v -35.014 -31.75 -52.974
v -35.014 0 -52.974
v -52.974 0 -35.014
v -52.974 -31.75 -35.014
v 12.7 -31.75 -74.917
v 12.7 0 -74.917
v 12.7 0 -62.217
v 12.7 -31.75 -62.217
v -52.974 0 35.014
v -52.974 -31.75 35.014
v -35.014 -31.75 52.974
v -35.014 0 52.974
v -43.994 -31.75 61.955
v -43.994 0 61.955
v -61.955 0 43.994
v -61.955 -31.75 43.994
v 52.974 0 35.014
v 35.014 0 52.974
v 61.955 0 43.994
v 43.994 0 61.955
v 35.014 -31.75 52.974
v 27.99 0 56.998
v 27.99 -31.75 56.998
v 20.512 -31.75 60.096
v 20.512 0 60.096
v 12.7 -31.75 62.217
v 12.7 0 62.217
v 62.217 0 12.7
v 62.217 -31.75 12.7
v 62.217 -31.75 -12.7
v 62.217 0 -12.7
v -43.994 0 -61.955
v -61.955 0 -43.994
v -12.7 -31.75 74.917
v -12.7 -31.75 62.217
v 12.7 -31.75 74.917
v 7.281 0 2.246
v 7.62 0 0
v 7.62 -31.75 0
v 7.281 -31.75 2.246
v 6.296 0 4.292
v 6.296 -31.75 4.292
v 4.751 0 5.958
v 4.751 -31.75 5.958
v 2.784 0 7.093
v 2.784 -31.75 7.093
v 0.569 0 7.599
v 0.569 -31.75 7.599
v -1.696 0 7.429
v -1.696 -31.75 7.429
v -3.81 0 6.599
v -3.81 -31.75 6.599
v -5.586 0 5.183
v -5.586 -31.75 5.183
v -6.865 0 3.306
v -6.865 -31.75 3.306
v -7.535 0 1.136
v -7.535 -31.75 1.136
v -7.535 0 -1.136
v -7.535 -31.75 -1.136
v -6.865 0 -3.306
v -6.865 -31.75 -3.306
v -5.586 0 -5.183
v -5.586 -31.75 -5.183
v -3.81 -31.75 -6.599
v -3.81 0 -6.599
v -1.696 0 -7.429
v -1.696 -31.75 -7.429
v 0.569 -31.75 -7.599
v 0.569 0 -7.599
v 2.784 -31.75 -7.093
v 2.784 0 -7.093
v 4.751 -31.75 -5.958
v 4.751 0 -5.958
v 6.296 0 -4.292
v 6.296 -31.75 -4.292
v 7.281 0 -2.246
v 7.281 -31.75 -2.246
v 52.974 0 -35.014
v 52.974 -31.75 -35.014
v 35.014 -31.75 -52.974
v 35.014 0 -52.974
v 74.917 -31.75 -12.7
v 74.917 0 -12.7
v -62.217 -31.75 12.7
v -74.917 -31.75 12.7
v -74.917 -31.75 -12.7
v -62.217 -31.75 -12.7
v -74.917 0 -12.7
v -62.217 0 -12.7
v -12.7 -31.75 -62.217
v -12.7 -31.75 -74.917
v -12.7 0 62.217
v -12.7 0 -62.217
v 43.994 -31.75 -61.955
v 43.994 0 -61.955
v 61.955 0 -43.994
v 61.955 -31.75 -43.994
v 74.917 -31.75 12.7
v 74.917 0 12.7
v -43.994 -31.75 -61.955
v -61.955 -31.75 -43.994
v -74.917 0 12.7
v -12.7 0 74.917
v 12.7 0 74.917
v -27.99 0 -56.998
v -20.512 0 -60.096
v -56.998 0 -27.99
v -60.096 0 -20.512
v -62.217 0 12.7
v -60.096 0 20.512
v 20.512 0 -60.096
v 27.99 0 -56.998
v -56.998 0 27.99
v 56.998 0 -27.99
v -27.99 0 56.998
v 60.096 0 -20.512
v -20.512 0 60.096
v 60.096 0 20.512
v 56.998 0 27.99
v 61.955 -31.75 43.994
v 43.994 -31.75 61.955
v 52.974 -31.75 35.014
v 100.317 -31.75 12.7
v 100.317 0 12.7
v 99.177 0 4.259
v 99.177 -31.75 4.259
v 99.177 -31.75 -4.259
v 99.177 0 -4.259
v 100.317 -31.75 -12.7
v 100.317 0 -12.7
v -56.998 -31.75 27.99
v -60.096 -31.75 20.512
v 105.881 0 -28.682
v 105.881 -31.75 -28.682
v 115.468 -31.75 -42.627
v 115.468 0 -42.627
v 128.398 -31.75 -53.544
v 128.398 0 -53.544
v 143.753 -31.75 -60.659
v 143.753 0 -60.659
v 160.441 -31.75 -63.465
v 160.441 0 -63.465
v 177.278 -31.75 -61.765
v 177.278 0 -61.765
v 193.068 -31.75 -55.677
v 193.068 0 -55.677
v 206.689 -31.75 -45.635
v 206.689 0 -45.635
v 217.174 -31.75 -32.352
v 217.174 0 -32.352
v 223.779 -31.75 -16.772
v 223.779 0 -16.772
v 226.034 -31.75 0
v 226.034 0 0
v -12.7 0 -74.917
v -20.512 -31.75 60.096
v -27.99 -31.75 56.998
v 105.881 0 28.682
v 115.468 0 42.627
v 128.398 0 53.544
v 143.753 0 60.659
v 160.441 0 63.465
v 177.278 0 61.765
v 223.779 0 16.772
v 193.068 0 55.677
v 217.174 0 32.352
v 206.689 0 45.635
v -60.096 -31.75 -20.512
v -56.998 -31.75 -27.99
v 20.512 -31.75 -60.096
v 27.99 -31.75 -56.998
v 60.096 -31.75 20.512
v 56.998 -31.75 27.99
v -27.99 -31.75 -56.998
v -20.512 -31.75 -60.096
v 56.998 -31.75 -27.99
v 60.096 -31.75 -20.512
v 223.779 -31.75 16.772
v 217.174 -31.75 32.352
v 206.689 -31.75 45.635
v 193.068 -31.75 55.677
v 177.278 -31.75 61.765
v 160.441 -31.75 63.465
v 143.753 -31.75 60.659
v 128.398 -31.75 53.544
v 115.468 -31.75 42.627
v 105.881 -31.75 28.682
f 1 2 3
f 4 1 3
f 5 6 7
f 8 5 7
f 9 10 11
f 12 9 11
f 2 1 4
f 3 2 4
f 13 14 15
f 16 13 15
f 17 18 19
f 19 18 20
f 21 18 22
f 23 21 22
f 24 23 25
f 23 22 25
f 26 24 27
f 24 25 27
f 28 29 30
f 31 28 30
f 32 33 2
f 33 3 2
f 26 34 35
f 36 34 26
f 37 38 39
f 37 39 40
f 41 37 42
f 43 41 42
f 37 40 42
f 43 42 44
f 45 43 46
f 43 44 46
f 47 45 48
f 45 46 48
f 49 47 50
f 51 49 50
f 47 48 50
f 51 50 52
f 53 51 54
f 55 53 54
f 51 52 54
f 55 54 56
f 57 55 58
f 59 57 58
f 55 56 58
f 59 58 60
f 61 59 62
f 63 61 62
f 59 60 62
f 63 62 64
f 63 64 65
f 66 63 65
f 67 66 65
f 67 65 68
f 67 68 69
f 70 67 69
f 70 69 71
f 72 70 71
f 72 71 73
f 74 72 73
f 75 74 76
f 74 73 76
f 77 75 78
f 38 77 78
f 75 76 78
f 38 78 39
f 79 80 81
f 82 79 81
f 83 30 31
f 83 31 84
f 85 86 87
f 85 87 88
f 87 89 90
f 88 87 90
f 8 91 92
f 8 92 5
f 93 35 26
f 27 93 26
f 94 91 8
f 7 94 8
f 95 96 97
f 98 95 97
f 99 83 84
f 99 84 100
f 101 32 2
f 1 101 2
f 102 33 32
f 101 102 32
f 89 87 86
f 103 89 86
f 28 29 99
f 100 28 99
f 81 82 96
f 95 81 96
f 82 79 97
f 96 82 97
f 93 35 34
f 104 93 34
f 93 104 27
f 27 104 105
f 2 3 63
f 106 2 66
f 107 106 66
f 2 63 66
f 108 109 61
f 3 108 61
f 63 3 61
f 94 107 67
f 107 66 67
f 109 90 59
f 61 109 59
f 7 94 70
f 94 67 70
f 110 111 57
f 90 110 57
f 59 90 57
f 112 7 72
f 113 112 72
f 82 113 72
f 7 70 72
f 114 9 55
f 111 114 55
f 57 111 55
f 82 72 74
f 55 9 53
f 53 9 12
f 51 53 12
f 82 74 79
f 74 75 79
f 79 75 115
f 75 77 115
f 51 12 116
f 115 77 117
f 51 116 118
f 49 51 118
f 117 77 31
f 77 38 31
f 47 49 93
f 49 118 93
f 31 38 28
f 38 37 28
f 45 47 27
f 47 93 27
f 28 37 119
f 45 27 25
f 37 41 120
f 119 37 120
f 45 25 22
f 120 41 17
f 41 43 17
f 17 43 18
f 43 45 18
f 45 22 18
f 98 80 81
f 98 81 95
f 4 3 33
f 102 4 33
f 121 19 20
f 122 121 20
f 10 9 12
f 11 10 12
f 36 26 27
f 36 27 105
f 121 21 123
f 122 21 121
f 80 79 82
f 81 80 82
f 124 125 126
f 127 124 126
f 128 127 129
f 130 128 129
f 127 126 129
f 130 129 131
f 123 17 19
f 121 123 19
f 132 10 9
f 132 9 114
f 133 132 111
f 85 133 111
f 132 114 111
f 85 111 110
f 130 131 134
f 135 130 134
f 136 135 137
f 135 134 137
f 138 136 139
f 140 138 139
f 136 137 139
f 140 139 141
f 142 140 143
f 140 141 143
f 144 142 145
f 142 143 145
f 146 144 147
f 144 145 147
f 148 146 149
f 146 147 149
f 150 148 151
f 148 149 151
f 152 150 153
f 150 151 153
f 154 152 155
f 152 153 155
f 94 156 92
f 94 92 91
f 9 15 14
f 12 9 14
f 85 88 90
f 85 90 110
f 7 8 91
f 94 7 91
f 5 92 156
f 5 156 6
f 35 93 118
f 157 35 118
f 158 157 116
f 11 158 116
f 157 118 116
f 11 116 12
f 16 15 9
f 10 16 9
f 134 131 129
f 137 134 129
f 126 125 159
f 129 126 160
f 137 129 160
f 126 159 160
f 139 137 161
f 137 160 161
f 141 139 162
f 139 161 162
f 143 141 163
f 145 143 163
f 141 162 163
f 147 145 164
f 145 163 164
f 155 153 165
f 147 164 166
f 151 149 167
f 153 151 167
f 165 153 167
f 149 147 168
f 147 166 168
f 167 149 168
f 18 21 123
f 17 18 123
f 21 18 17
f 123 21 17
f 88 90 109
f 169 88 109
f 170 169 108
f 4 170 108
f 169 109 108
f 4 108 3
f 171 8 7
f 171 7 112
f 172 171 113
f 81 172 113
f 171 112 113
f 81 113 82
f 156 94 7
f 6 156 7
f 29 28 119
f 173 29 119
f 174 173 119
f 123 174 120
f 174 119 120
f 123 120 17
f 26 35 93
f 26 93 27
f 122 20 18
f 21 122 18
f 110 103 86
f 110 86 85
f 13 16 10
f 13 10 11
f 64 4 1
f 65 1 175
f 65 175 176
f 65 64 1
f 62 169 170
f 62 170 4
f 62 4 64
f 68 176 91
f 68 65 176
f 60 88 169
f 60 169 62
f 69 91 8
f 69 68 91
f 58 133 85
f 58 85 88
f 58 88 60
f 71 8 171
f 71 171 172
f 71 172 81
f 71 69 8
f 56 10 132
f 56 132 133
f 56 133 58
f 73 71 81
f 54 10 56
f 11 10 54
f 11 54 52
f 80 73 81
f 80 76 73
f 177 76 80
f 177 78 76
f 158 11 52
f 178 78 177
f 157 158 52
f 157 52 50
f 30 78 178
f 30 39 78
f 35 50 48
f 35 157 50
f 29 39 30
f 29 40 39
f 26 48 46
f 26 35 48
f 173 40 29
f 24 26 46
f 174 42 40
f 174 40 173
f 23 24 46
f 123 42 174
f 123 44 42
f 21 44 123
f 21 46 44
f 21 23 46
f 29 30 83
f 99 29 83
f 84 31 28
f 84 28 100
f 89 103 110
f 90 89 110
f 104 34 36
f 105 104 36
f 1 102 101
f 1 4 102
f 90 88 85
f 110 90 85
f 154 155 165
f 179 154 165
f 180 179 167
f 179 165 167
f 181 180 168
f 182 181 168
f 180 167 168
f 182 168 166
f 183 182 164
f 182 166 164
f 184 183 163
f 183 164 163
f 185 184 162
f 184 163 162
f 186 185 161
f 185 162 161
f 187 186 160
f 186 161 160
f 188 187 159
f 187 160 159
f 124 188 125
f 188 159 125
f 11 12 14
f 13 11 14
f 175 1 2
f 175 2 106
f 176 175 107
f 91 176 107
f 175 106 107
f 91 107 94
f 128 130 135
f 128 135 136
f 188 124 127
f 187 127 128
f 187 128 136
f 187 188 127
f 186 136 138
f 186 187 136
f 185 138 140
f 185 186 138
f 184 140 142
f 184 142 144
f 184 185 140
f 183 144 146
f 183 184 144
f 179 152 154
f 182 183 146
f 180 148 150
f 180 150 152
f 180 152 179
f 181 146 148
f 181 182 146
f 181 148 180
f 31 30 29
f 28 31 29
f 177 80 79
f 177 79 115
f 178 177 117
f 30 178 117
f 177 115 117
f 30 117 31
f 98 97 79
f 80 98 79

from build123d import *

# Parameters (mm, degrees)
F0_R     = 63.5
F1_DEPTH = 31.75
F3_DEPTH = 31.75
F4_W     = 25.4
F4_H     = 12.7
F5_DEPTH = 31.75
F4_W_2   = 12.7
F4_H_2   = 25.4
F6_R     = 7.62
F7_DEPTH = 31.75
F9_DEPTH = 31.75


with BuildPart() as f1:
    # F0 (on Front) → F1 (new body)
    with BuildSketch(Plane.XZ):
        Circle(F0_R)
    extrude(amount=F1_DEPTH)

    # F2 (on face) → F3 (cut)
    with BuildSketch(Plane.XZ.offset(31.75)):
        with BuildLine():
            ThreePointArc((12.7, 62.2170394667), (0, 63.5), (-12.7, 62.2170394667))
            Line((-12.7, 62.2170394667), (12.7, 62.2170394667))
        make_face()
        with BuildLine():
            Line((-52.9743466333, 35.0138343912), (-35.0138343912, 52.9743466333))
            ThreePointArc((-35.0138343912, 52.9743466333), (-44.9012806053, 44.9012806053), (-52.9743466333, 35.0138343912))
        make_face()
        with BuildLine():
            Line((-62.2170394667, -12.7), (-62.2170394667, 12.7))
            ThreePointArc((-62.2170394667, 12.7), (-63.5, 0), (-62.2170394667, -12.7))
        make_face()
        with BuildLine():
            Line((-35.0138343912, -52.9743466333), (-52.9743466333, -35.0138343912))
            ThreePointArc((-52.9743466333, -35.0138343912), (-44.9012806053, -44.9012806053), (-35.0138343912, -52.9743466333))
        make_face()
        with BuildLine():
            Line((12.7, -62.2170394667), (-12.7, -62.2170394667))
            ThreePointArc((-12.7, -62.2170394667), (0, -63.5), (12.7, -62.2170394667))
        make_face()
        with BuildLine():
            Line((52.9743466333, -35.0138343912), (35.0138343912, -52.9743466333))
            ThreePointArc((35.0138343912, -52.9743466333), (44.9012806053, -44.9012806053), (52.9743466333, -35.0138343912))
        make_face()
        with BuildLine():
            Line((62.2170394667, 12.7), (62.2170394667, -12.7))
            ThreePointArc((62.2170394667, -12.7), (63.5, 0), (62.2170394667, 12.7))
        make_face()
        with BuildLine():
            Line((35.0138343912, 52.9743466333), (52.9743466333, 35.0138343912))
            ThreePointArc((52.9743466333, 35.0138343912), (44.9012806053, 44.9012806053), (35.0138343912, 52.9743466333))
        make_face()
    extrude(amount=-F3_DEPTH, mode=Mode.SUBTRACT)

    # F6 (on face) → F7 (cut)
    with BuildSketch(Plane.XZ.offset(31.75)):
        Circle(F6_R)
    extrude(amount=-F7_DEPTH, mode=Mode.SUBTRACT)


with BuildPart() as f5:
    # F4 (on Front) → F5 (new body)
    with BuildSketch(Plane.XZ):
        with Locations((0, 68.5670394667)):
            Rectangle(F4_W, F4_H)
    extrude(amount=F5_DEPTH)


with BuildPart() as f5b:
    # F4 (on Front) → F5, piece 2 (new body)
    with BuildSketch(Plane.XZ):
        Polygon((-43.9940905122, 61.9546027544), (-61.9546027544, 43.9940905122), (-52.9743466333, 35.0138343912), (-35.0138343912, 52.9743466333), align=None)
    extrude(amount=F5_DEPTH)


with BuildPart() as f5c:
    # F4 (on Front) → F5, piece 3 (new body)
    with BuildSketch(Plane.XZ):
        with Locations((-68.5670394667, 0)):
            Rectangle(F4_W_2, F4_H_2)
    extrude(amount=F5_DEPTH)


with BuildPart() as f5d:
    # F4 (on Front) → F5, piece 4 (new body)
    with BuildSketch(Plane.XZ):
        Polygon((-61.9546027544, -43.9940905122), (-43.9940905122, -61.9546027544), (-35.0138343912, -52.9743466333), (-52.9743466333, -35.0138343912), align=None)
    extrude(amount=F5_DEPTH)


with BuildPart() as f5e:
    # F4 (on Front) → F5, piece 5 (new body)
    with BuildSketch(Plane.XZ):
        with Locations((0, -68.5670394667)):
            Rectangle(F4_W, F4_H)
    extrude(amount=F5_DEPTH)


with BuildPart() as f5f:
    # F4 (on Front) → F5, piece 6 (new body)
    with BuildSketch(Plane.XZ):
        Polygon((43.9940905122, -61.9546027544), (61.9546027544, -43.9940905122), (52.9743466333, -35.0138343912), (35.0138343912, -52.9743466333), align=None)
    extrude(amount=F5_DEPTH)


with BuildPart() as f5g:
    # F4 (on Front) → F5, piece 7 (new body)
    with BuildSketch(Plane.XZ):
        with Locations((68.5670394667, 0)):
            Rectangle(F4_W_2, F4_H_2)
    extrude(amount=F5_DEPTH)


with BuildPart() as f5h:
    # F4 (on Front) → F5, piece 8 (new body)
    with BuildSketch(Plane.XZ):
        Polygon((61.9546027544, 43.9940905122), (43.9940905122, 61.9546027544), (35.0138343912, 52.9743466333), (52.9743466333, 35.0138343912), align=None)
    extrude(amount=F5_DEPTH)


with BuildPart() as f9:
    # F8 (on Front) → F9 (new body)
    with BuildSketch(Plane.XZ):
        with BuildLine():
            ThreePointArc((226.0340789334, 0), (168.9163980207, 63.1784457158), (100.3170394667, 12.7))
            ThreePointArc((100.3170394667, 12.7), (99.0340789334, 0), (100.3170394667, -12.7))
            ThreePointArc((100.3170394667, -12.7), (168.9163980207, -63.1784457158), (226.0340789334, 0))
        make_face()
    extrude(amount=F9_DEPTH)


solid = Compound([f1.part, f5.part, f5b.part, f5c.part, f5d.part, f5e.part, f5f.part, f5g.part, f5h.part, f9.part])
